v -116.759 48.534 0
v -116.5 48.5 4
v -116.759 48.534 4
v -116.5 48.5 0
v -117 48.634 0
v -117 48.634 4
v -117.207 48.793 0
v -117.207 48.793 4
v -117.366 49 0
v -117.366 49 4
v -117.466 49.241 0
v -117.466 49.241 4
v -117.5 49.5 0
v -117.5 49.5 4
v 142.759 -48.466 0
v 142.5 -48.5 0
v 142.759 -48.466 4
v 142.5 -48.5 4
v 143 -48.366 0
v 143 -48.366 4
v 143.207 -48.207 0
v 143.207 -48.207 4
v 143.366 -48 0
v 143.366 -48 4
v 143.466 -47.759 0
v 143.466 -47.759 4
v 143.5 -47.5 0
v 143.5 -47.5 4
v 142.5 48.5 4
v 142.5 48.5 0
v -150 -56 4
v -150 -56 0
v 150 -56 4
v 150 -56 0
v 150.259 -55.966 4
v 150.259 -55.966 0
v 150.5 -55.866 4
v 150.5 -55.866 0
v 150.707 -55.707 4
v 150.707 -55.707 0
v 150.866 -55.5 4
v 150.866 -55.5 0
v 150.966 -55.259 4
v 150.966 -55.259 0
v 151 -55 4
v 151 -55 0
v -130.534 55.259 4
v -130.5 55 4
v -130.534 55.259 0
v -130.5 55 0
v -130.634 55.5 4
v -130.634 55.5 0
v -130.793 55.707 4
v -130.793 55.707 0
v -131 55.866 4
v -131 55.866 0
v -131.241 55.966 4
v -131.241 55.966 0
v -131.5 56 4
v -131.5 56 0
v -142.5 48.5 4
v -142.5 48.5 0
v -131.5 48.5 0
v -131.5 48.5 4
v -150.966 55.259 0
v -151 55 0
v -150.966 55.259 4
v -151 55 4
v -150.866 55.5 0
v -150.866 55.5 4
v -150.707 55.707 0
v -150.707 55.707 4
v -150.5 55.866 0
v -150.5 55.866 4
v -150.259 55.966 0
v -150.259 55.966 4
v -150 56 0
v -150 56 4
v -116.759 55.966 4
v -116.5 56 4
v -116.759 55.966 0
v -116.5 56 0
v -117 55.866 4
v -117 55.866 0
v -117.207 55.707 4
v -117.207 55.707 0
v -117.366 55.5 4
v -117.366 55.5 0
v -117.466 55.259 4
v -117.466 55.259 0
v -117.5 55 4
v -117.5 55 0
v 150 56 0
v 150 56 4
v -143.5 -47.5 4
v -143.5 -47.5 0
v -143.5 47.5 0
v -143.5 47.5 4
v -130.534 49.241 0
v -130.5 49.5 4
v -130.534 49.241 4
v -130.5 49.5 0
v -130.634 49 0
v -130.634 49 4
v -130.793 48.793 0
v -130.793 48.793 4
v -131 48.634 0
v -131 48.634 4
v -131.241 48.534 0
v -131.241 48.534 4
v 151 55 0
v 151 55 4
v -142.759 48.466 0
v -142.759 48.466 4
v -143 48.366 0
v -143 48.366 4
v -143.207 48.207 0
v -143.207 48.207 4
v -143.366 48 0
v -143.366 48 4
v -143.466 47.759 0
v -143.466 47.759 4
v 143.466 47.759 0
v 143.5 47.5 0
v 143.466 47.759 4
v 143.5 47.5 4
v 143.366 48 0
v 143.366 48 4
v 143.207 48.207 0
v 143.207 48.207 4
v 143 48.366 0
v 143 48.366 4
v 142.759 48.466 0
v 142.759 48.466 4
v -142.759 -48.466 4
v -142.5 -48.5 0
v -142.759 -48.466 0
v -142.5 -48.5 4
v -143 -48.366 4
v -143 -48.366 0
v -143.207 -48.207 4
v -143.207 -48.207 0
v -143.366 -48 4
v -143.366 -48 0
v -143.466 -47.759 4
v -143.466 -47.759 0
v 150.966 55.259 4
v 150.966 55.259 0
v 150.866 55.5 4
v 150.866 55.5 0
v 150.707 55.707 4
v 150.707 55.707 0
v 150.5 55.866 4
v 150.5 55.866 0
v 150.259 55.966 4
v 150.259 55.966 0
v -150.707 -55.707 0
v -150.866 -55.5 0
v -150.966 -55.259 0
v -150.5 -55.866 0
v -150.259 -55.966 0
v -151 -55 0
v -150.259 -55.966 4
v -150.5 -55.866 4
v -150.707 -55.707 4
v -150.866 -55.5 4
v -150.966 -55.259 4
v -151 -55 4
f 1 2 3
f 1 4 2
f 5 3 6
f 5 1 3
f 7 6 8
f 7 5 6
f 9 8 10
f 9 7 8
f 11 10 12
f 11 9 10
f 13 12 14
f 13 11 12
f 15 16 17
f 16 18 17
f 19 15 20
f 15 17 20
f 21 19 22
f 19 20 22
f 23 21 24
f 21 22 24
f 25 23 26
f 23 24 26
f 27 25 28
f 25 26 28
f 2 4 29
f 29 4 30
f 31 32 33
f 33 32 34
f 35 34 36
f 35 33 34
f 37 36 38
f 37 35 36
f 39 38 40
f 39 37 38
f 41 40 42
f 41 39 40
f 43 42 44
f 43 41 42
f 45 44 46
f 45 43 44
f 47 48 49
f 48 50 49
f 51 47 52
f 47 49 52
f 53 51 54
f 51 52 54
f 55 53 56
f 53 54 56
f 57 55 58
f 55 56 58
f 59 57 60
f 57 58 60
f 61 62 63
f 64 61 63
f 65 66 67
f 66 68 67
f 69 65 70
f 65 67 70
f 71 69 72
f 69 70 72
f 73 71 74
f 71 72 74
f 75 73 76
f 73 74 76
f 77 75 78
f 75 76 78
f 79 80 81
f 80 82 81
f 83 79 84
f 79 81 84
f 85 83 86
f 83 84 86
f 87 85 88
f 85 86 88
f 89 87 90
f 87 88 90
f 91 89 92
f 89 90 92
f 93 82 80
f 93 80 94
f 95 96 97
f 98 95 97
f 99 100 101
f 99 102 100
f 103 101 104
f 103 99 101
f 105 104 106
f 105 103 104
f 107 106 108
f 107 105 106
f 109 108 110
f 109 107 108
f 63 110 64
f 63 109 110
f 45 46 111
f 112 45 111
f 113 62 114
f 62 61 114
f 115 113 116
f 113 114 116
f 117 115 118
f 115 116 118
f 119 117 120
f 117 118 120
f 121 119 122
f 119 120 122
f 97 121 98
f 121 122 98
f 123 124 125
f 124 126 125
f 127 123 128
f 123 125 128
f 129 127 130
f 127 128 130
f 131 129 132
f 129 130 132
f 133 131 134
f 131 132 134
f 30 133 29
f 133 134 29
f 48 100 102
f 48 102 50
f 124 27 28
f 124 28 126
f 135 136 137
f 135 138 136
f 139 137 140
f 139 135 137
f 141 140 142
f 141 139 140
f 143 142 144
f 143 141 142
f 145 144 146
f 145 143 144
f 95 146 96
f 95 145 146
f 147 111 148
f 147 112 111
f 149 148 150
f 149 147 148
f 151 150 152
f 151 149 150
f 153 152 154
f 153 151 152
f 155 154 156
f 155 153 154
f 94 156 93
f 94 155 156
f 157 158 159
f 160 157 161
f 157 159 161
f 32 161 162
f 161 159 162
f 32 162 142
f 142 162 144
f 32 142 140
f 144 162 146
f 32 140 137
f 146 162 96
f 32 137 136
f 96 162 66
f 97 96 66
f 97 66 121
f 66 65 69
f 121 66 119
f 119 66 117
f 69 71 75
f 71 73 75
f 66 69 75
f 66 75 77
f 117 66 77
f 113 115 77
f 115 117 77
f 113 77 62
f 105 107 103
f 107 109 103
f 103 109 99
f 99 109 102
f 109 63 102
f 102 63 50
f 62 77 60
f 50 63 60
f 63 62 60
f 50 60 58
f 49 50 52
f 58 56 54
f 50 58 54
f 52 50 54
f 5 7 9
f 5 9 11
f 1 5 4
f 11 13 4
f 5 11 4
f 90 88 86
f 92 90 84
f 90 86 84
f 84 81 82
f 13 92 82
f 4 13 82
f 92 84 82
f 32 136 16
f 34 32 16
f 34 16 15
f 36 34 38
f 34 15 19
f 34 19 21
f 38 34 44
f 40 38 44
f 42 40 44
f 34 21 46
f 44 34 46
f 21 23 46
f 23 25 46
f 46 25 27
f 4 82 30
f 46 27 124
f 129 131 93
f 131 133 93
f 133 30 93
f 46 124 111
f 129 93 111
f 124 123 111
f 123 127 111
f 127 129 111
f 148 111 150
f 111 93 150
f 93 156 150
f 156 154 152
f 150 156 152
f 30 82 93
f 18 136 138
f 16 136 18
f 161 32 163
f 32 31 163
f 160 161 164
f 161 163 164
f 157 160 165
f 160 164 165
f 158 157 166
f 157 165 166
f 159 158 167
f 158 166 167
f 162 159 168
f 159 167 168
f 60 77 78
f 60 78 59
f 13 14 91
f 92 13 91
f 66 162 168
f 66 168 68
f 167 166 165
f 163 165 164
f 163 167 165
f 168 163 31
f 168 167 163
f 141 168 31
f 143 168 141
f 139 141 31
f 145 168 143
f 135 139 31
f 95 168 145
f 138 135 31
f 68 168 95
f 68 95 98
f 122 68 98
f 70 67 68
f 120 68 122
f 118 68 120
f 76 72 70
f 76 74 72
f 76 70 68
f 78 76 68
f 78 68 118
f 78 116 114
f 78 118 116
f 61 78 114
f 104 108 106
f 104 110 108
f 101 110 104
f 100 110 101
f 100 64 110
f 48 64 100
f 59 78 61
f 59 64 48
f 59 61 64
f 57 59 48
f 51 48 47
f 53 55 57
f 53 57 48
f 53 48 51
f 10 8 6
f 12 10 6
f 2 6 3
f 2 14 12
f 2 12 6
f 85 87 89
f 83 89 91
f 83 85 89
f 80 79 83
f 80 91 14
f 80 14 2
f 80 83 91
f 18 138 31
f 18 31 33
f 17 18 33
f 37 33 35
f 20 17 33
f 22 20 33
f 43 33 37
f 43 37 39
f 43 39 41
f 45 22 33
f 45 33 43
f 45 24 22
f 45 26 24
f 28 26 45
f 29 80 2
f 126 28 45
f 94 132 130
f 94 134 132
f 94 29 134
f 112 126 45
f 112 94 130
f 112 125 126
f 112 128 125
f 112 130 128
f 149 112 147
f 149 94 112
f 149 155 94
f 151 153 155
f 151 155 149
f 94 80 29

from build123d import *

# Parameters (mm, degrees)
SKETCH_W     = 302
SKETCH_H     = 112
SKETCH_W_2   = 287
SKETCH_H_2   = 97
PAD_DEPTH    = 4
SKETCH001_W  = 13
SKETCH001_H  = 7.5
POCKET_DEPTH = 4
FILLET_R     = 1
FILLET001_R  = 1
FILLET002_R  = 1
FILLET003_R  = 1
FILLET004_R  = 1
FILLET005_R  = 1
FILLET006_R  = 1
FILLET007_R  = 1
FILLET008_R  = 1
FILLET009_R  = 1
FILLET010_R  = 1
FILLET011_R  = 1


with BuildPart() as part:
    # Sketch → Pad (new body)
    with BuildSketch(Plane.XY):
        Rectangle(SKETCH_W, SKETCH_H)
        Rectangle(SKETCH_W_2, SKETCH_H_2, mode=Mode.SUBTRACT)
    extrude(amount=PAD_DEPTH)

    # Sketch001 (on Face10 of Pad) → Pocket (cut)
    with BuildSketch(Plane.XY.offset(4)):
        with Locations((-124, 52.25)):
            Rectangle(SKETCH001_W, SKETCH001_H)
    extrude(amount=-POCKET_DEPTH, mode=Mode.SUBTRACT)

    # Fillet
    fillet_edges = [part.edges().sort_by_distance(p)[0] for p in [
        (-130.5, 48.5, 2),
    ]]
    fillet(fillet_edges, radius=FILLET_R)

    # Fillet001
    fillet001_edges = [part.edges().sort_by_distance(p)[0] for p in [
        (-143.5, 48.5, 2),
    ]]
    fillet(fillet001_edges, radius=FILLET001_R)

    # Fillet002
    fillet002_edges = [part.edges().sort_by_distance(p)[0] for p in [
        (-117.5, 48.5, 2),
    ]]
    fillet(fillet002_edges, radius=FILLET002_R)

    # Fillet003
    fillet003_edges = [part.edges().sort_by_distance(p)[0] for p in [
        (-151, -56, 2),
    ]]
    fillet(fillet003_edges, radius=FILLET003_R)

    # Fillet004
    fillet004_edges = [part.edges().sort_by_distance(p)[0] for p in [
        (151, -56, 2),
    ]]
    fillet(fillet004_edges, radius=FILLET004_R)

    # Fillet005
    fillet005_edges = [part.edges().sort_by_distance(p)[0] for p in [
        (151, 56, 2),
    ]]
    fillet(fillet005_edges, radius=FILLET005_R)

    # Fillet006
    fillet006_edges = [part.edges().sort_by_distance(p)[0] for p in [
        (-117.5, 56, 2),
    ]]
    fillet(fillet006_edges, radius=FILLET006_R)

    # Fillet007
    fillet007_edges = [part.edges().sort_by_distance(p)[0] for p in [
        (-151, 56, 2),
    ]]
    fillet(fillet007_edges, radius=FILLET007_R)

    # Fillet008
    fillet008_edges = [part.edges().sort_by_distance(p)[0] for p in [
        (143.5, -48.5, 2),
    ]]
    fillet(fillet008_edges, radius=FILLET008_R)

    # Fillet009
    fillet009_edges = [part.edges().sort_by_distance(p)[0] for p in [
        (-143.5, -48.5, 2),
    ]]
    fillet(fillet009_edges, radius=FILLET009_R)

    # Fillet010
    fillet010_edges = [part.edges().sort_by_distance(p)[0] for p in [
        (143.5, 48.5, 2),
    ]]
    fillet(fillet010_edges, radius=FILLET010_R)

    # Fillet011
    fillet011_edges = [part.edges().sort_by_distance(p)[0] for p in [
        (-130.5, 56, 2),
    ]]
    fillet(fillet011_edges, radius=FILLET011_R)


solid = part.part
